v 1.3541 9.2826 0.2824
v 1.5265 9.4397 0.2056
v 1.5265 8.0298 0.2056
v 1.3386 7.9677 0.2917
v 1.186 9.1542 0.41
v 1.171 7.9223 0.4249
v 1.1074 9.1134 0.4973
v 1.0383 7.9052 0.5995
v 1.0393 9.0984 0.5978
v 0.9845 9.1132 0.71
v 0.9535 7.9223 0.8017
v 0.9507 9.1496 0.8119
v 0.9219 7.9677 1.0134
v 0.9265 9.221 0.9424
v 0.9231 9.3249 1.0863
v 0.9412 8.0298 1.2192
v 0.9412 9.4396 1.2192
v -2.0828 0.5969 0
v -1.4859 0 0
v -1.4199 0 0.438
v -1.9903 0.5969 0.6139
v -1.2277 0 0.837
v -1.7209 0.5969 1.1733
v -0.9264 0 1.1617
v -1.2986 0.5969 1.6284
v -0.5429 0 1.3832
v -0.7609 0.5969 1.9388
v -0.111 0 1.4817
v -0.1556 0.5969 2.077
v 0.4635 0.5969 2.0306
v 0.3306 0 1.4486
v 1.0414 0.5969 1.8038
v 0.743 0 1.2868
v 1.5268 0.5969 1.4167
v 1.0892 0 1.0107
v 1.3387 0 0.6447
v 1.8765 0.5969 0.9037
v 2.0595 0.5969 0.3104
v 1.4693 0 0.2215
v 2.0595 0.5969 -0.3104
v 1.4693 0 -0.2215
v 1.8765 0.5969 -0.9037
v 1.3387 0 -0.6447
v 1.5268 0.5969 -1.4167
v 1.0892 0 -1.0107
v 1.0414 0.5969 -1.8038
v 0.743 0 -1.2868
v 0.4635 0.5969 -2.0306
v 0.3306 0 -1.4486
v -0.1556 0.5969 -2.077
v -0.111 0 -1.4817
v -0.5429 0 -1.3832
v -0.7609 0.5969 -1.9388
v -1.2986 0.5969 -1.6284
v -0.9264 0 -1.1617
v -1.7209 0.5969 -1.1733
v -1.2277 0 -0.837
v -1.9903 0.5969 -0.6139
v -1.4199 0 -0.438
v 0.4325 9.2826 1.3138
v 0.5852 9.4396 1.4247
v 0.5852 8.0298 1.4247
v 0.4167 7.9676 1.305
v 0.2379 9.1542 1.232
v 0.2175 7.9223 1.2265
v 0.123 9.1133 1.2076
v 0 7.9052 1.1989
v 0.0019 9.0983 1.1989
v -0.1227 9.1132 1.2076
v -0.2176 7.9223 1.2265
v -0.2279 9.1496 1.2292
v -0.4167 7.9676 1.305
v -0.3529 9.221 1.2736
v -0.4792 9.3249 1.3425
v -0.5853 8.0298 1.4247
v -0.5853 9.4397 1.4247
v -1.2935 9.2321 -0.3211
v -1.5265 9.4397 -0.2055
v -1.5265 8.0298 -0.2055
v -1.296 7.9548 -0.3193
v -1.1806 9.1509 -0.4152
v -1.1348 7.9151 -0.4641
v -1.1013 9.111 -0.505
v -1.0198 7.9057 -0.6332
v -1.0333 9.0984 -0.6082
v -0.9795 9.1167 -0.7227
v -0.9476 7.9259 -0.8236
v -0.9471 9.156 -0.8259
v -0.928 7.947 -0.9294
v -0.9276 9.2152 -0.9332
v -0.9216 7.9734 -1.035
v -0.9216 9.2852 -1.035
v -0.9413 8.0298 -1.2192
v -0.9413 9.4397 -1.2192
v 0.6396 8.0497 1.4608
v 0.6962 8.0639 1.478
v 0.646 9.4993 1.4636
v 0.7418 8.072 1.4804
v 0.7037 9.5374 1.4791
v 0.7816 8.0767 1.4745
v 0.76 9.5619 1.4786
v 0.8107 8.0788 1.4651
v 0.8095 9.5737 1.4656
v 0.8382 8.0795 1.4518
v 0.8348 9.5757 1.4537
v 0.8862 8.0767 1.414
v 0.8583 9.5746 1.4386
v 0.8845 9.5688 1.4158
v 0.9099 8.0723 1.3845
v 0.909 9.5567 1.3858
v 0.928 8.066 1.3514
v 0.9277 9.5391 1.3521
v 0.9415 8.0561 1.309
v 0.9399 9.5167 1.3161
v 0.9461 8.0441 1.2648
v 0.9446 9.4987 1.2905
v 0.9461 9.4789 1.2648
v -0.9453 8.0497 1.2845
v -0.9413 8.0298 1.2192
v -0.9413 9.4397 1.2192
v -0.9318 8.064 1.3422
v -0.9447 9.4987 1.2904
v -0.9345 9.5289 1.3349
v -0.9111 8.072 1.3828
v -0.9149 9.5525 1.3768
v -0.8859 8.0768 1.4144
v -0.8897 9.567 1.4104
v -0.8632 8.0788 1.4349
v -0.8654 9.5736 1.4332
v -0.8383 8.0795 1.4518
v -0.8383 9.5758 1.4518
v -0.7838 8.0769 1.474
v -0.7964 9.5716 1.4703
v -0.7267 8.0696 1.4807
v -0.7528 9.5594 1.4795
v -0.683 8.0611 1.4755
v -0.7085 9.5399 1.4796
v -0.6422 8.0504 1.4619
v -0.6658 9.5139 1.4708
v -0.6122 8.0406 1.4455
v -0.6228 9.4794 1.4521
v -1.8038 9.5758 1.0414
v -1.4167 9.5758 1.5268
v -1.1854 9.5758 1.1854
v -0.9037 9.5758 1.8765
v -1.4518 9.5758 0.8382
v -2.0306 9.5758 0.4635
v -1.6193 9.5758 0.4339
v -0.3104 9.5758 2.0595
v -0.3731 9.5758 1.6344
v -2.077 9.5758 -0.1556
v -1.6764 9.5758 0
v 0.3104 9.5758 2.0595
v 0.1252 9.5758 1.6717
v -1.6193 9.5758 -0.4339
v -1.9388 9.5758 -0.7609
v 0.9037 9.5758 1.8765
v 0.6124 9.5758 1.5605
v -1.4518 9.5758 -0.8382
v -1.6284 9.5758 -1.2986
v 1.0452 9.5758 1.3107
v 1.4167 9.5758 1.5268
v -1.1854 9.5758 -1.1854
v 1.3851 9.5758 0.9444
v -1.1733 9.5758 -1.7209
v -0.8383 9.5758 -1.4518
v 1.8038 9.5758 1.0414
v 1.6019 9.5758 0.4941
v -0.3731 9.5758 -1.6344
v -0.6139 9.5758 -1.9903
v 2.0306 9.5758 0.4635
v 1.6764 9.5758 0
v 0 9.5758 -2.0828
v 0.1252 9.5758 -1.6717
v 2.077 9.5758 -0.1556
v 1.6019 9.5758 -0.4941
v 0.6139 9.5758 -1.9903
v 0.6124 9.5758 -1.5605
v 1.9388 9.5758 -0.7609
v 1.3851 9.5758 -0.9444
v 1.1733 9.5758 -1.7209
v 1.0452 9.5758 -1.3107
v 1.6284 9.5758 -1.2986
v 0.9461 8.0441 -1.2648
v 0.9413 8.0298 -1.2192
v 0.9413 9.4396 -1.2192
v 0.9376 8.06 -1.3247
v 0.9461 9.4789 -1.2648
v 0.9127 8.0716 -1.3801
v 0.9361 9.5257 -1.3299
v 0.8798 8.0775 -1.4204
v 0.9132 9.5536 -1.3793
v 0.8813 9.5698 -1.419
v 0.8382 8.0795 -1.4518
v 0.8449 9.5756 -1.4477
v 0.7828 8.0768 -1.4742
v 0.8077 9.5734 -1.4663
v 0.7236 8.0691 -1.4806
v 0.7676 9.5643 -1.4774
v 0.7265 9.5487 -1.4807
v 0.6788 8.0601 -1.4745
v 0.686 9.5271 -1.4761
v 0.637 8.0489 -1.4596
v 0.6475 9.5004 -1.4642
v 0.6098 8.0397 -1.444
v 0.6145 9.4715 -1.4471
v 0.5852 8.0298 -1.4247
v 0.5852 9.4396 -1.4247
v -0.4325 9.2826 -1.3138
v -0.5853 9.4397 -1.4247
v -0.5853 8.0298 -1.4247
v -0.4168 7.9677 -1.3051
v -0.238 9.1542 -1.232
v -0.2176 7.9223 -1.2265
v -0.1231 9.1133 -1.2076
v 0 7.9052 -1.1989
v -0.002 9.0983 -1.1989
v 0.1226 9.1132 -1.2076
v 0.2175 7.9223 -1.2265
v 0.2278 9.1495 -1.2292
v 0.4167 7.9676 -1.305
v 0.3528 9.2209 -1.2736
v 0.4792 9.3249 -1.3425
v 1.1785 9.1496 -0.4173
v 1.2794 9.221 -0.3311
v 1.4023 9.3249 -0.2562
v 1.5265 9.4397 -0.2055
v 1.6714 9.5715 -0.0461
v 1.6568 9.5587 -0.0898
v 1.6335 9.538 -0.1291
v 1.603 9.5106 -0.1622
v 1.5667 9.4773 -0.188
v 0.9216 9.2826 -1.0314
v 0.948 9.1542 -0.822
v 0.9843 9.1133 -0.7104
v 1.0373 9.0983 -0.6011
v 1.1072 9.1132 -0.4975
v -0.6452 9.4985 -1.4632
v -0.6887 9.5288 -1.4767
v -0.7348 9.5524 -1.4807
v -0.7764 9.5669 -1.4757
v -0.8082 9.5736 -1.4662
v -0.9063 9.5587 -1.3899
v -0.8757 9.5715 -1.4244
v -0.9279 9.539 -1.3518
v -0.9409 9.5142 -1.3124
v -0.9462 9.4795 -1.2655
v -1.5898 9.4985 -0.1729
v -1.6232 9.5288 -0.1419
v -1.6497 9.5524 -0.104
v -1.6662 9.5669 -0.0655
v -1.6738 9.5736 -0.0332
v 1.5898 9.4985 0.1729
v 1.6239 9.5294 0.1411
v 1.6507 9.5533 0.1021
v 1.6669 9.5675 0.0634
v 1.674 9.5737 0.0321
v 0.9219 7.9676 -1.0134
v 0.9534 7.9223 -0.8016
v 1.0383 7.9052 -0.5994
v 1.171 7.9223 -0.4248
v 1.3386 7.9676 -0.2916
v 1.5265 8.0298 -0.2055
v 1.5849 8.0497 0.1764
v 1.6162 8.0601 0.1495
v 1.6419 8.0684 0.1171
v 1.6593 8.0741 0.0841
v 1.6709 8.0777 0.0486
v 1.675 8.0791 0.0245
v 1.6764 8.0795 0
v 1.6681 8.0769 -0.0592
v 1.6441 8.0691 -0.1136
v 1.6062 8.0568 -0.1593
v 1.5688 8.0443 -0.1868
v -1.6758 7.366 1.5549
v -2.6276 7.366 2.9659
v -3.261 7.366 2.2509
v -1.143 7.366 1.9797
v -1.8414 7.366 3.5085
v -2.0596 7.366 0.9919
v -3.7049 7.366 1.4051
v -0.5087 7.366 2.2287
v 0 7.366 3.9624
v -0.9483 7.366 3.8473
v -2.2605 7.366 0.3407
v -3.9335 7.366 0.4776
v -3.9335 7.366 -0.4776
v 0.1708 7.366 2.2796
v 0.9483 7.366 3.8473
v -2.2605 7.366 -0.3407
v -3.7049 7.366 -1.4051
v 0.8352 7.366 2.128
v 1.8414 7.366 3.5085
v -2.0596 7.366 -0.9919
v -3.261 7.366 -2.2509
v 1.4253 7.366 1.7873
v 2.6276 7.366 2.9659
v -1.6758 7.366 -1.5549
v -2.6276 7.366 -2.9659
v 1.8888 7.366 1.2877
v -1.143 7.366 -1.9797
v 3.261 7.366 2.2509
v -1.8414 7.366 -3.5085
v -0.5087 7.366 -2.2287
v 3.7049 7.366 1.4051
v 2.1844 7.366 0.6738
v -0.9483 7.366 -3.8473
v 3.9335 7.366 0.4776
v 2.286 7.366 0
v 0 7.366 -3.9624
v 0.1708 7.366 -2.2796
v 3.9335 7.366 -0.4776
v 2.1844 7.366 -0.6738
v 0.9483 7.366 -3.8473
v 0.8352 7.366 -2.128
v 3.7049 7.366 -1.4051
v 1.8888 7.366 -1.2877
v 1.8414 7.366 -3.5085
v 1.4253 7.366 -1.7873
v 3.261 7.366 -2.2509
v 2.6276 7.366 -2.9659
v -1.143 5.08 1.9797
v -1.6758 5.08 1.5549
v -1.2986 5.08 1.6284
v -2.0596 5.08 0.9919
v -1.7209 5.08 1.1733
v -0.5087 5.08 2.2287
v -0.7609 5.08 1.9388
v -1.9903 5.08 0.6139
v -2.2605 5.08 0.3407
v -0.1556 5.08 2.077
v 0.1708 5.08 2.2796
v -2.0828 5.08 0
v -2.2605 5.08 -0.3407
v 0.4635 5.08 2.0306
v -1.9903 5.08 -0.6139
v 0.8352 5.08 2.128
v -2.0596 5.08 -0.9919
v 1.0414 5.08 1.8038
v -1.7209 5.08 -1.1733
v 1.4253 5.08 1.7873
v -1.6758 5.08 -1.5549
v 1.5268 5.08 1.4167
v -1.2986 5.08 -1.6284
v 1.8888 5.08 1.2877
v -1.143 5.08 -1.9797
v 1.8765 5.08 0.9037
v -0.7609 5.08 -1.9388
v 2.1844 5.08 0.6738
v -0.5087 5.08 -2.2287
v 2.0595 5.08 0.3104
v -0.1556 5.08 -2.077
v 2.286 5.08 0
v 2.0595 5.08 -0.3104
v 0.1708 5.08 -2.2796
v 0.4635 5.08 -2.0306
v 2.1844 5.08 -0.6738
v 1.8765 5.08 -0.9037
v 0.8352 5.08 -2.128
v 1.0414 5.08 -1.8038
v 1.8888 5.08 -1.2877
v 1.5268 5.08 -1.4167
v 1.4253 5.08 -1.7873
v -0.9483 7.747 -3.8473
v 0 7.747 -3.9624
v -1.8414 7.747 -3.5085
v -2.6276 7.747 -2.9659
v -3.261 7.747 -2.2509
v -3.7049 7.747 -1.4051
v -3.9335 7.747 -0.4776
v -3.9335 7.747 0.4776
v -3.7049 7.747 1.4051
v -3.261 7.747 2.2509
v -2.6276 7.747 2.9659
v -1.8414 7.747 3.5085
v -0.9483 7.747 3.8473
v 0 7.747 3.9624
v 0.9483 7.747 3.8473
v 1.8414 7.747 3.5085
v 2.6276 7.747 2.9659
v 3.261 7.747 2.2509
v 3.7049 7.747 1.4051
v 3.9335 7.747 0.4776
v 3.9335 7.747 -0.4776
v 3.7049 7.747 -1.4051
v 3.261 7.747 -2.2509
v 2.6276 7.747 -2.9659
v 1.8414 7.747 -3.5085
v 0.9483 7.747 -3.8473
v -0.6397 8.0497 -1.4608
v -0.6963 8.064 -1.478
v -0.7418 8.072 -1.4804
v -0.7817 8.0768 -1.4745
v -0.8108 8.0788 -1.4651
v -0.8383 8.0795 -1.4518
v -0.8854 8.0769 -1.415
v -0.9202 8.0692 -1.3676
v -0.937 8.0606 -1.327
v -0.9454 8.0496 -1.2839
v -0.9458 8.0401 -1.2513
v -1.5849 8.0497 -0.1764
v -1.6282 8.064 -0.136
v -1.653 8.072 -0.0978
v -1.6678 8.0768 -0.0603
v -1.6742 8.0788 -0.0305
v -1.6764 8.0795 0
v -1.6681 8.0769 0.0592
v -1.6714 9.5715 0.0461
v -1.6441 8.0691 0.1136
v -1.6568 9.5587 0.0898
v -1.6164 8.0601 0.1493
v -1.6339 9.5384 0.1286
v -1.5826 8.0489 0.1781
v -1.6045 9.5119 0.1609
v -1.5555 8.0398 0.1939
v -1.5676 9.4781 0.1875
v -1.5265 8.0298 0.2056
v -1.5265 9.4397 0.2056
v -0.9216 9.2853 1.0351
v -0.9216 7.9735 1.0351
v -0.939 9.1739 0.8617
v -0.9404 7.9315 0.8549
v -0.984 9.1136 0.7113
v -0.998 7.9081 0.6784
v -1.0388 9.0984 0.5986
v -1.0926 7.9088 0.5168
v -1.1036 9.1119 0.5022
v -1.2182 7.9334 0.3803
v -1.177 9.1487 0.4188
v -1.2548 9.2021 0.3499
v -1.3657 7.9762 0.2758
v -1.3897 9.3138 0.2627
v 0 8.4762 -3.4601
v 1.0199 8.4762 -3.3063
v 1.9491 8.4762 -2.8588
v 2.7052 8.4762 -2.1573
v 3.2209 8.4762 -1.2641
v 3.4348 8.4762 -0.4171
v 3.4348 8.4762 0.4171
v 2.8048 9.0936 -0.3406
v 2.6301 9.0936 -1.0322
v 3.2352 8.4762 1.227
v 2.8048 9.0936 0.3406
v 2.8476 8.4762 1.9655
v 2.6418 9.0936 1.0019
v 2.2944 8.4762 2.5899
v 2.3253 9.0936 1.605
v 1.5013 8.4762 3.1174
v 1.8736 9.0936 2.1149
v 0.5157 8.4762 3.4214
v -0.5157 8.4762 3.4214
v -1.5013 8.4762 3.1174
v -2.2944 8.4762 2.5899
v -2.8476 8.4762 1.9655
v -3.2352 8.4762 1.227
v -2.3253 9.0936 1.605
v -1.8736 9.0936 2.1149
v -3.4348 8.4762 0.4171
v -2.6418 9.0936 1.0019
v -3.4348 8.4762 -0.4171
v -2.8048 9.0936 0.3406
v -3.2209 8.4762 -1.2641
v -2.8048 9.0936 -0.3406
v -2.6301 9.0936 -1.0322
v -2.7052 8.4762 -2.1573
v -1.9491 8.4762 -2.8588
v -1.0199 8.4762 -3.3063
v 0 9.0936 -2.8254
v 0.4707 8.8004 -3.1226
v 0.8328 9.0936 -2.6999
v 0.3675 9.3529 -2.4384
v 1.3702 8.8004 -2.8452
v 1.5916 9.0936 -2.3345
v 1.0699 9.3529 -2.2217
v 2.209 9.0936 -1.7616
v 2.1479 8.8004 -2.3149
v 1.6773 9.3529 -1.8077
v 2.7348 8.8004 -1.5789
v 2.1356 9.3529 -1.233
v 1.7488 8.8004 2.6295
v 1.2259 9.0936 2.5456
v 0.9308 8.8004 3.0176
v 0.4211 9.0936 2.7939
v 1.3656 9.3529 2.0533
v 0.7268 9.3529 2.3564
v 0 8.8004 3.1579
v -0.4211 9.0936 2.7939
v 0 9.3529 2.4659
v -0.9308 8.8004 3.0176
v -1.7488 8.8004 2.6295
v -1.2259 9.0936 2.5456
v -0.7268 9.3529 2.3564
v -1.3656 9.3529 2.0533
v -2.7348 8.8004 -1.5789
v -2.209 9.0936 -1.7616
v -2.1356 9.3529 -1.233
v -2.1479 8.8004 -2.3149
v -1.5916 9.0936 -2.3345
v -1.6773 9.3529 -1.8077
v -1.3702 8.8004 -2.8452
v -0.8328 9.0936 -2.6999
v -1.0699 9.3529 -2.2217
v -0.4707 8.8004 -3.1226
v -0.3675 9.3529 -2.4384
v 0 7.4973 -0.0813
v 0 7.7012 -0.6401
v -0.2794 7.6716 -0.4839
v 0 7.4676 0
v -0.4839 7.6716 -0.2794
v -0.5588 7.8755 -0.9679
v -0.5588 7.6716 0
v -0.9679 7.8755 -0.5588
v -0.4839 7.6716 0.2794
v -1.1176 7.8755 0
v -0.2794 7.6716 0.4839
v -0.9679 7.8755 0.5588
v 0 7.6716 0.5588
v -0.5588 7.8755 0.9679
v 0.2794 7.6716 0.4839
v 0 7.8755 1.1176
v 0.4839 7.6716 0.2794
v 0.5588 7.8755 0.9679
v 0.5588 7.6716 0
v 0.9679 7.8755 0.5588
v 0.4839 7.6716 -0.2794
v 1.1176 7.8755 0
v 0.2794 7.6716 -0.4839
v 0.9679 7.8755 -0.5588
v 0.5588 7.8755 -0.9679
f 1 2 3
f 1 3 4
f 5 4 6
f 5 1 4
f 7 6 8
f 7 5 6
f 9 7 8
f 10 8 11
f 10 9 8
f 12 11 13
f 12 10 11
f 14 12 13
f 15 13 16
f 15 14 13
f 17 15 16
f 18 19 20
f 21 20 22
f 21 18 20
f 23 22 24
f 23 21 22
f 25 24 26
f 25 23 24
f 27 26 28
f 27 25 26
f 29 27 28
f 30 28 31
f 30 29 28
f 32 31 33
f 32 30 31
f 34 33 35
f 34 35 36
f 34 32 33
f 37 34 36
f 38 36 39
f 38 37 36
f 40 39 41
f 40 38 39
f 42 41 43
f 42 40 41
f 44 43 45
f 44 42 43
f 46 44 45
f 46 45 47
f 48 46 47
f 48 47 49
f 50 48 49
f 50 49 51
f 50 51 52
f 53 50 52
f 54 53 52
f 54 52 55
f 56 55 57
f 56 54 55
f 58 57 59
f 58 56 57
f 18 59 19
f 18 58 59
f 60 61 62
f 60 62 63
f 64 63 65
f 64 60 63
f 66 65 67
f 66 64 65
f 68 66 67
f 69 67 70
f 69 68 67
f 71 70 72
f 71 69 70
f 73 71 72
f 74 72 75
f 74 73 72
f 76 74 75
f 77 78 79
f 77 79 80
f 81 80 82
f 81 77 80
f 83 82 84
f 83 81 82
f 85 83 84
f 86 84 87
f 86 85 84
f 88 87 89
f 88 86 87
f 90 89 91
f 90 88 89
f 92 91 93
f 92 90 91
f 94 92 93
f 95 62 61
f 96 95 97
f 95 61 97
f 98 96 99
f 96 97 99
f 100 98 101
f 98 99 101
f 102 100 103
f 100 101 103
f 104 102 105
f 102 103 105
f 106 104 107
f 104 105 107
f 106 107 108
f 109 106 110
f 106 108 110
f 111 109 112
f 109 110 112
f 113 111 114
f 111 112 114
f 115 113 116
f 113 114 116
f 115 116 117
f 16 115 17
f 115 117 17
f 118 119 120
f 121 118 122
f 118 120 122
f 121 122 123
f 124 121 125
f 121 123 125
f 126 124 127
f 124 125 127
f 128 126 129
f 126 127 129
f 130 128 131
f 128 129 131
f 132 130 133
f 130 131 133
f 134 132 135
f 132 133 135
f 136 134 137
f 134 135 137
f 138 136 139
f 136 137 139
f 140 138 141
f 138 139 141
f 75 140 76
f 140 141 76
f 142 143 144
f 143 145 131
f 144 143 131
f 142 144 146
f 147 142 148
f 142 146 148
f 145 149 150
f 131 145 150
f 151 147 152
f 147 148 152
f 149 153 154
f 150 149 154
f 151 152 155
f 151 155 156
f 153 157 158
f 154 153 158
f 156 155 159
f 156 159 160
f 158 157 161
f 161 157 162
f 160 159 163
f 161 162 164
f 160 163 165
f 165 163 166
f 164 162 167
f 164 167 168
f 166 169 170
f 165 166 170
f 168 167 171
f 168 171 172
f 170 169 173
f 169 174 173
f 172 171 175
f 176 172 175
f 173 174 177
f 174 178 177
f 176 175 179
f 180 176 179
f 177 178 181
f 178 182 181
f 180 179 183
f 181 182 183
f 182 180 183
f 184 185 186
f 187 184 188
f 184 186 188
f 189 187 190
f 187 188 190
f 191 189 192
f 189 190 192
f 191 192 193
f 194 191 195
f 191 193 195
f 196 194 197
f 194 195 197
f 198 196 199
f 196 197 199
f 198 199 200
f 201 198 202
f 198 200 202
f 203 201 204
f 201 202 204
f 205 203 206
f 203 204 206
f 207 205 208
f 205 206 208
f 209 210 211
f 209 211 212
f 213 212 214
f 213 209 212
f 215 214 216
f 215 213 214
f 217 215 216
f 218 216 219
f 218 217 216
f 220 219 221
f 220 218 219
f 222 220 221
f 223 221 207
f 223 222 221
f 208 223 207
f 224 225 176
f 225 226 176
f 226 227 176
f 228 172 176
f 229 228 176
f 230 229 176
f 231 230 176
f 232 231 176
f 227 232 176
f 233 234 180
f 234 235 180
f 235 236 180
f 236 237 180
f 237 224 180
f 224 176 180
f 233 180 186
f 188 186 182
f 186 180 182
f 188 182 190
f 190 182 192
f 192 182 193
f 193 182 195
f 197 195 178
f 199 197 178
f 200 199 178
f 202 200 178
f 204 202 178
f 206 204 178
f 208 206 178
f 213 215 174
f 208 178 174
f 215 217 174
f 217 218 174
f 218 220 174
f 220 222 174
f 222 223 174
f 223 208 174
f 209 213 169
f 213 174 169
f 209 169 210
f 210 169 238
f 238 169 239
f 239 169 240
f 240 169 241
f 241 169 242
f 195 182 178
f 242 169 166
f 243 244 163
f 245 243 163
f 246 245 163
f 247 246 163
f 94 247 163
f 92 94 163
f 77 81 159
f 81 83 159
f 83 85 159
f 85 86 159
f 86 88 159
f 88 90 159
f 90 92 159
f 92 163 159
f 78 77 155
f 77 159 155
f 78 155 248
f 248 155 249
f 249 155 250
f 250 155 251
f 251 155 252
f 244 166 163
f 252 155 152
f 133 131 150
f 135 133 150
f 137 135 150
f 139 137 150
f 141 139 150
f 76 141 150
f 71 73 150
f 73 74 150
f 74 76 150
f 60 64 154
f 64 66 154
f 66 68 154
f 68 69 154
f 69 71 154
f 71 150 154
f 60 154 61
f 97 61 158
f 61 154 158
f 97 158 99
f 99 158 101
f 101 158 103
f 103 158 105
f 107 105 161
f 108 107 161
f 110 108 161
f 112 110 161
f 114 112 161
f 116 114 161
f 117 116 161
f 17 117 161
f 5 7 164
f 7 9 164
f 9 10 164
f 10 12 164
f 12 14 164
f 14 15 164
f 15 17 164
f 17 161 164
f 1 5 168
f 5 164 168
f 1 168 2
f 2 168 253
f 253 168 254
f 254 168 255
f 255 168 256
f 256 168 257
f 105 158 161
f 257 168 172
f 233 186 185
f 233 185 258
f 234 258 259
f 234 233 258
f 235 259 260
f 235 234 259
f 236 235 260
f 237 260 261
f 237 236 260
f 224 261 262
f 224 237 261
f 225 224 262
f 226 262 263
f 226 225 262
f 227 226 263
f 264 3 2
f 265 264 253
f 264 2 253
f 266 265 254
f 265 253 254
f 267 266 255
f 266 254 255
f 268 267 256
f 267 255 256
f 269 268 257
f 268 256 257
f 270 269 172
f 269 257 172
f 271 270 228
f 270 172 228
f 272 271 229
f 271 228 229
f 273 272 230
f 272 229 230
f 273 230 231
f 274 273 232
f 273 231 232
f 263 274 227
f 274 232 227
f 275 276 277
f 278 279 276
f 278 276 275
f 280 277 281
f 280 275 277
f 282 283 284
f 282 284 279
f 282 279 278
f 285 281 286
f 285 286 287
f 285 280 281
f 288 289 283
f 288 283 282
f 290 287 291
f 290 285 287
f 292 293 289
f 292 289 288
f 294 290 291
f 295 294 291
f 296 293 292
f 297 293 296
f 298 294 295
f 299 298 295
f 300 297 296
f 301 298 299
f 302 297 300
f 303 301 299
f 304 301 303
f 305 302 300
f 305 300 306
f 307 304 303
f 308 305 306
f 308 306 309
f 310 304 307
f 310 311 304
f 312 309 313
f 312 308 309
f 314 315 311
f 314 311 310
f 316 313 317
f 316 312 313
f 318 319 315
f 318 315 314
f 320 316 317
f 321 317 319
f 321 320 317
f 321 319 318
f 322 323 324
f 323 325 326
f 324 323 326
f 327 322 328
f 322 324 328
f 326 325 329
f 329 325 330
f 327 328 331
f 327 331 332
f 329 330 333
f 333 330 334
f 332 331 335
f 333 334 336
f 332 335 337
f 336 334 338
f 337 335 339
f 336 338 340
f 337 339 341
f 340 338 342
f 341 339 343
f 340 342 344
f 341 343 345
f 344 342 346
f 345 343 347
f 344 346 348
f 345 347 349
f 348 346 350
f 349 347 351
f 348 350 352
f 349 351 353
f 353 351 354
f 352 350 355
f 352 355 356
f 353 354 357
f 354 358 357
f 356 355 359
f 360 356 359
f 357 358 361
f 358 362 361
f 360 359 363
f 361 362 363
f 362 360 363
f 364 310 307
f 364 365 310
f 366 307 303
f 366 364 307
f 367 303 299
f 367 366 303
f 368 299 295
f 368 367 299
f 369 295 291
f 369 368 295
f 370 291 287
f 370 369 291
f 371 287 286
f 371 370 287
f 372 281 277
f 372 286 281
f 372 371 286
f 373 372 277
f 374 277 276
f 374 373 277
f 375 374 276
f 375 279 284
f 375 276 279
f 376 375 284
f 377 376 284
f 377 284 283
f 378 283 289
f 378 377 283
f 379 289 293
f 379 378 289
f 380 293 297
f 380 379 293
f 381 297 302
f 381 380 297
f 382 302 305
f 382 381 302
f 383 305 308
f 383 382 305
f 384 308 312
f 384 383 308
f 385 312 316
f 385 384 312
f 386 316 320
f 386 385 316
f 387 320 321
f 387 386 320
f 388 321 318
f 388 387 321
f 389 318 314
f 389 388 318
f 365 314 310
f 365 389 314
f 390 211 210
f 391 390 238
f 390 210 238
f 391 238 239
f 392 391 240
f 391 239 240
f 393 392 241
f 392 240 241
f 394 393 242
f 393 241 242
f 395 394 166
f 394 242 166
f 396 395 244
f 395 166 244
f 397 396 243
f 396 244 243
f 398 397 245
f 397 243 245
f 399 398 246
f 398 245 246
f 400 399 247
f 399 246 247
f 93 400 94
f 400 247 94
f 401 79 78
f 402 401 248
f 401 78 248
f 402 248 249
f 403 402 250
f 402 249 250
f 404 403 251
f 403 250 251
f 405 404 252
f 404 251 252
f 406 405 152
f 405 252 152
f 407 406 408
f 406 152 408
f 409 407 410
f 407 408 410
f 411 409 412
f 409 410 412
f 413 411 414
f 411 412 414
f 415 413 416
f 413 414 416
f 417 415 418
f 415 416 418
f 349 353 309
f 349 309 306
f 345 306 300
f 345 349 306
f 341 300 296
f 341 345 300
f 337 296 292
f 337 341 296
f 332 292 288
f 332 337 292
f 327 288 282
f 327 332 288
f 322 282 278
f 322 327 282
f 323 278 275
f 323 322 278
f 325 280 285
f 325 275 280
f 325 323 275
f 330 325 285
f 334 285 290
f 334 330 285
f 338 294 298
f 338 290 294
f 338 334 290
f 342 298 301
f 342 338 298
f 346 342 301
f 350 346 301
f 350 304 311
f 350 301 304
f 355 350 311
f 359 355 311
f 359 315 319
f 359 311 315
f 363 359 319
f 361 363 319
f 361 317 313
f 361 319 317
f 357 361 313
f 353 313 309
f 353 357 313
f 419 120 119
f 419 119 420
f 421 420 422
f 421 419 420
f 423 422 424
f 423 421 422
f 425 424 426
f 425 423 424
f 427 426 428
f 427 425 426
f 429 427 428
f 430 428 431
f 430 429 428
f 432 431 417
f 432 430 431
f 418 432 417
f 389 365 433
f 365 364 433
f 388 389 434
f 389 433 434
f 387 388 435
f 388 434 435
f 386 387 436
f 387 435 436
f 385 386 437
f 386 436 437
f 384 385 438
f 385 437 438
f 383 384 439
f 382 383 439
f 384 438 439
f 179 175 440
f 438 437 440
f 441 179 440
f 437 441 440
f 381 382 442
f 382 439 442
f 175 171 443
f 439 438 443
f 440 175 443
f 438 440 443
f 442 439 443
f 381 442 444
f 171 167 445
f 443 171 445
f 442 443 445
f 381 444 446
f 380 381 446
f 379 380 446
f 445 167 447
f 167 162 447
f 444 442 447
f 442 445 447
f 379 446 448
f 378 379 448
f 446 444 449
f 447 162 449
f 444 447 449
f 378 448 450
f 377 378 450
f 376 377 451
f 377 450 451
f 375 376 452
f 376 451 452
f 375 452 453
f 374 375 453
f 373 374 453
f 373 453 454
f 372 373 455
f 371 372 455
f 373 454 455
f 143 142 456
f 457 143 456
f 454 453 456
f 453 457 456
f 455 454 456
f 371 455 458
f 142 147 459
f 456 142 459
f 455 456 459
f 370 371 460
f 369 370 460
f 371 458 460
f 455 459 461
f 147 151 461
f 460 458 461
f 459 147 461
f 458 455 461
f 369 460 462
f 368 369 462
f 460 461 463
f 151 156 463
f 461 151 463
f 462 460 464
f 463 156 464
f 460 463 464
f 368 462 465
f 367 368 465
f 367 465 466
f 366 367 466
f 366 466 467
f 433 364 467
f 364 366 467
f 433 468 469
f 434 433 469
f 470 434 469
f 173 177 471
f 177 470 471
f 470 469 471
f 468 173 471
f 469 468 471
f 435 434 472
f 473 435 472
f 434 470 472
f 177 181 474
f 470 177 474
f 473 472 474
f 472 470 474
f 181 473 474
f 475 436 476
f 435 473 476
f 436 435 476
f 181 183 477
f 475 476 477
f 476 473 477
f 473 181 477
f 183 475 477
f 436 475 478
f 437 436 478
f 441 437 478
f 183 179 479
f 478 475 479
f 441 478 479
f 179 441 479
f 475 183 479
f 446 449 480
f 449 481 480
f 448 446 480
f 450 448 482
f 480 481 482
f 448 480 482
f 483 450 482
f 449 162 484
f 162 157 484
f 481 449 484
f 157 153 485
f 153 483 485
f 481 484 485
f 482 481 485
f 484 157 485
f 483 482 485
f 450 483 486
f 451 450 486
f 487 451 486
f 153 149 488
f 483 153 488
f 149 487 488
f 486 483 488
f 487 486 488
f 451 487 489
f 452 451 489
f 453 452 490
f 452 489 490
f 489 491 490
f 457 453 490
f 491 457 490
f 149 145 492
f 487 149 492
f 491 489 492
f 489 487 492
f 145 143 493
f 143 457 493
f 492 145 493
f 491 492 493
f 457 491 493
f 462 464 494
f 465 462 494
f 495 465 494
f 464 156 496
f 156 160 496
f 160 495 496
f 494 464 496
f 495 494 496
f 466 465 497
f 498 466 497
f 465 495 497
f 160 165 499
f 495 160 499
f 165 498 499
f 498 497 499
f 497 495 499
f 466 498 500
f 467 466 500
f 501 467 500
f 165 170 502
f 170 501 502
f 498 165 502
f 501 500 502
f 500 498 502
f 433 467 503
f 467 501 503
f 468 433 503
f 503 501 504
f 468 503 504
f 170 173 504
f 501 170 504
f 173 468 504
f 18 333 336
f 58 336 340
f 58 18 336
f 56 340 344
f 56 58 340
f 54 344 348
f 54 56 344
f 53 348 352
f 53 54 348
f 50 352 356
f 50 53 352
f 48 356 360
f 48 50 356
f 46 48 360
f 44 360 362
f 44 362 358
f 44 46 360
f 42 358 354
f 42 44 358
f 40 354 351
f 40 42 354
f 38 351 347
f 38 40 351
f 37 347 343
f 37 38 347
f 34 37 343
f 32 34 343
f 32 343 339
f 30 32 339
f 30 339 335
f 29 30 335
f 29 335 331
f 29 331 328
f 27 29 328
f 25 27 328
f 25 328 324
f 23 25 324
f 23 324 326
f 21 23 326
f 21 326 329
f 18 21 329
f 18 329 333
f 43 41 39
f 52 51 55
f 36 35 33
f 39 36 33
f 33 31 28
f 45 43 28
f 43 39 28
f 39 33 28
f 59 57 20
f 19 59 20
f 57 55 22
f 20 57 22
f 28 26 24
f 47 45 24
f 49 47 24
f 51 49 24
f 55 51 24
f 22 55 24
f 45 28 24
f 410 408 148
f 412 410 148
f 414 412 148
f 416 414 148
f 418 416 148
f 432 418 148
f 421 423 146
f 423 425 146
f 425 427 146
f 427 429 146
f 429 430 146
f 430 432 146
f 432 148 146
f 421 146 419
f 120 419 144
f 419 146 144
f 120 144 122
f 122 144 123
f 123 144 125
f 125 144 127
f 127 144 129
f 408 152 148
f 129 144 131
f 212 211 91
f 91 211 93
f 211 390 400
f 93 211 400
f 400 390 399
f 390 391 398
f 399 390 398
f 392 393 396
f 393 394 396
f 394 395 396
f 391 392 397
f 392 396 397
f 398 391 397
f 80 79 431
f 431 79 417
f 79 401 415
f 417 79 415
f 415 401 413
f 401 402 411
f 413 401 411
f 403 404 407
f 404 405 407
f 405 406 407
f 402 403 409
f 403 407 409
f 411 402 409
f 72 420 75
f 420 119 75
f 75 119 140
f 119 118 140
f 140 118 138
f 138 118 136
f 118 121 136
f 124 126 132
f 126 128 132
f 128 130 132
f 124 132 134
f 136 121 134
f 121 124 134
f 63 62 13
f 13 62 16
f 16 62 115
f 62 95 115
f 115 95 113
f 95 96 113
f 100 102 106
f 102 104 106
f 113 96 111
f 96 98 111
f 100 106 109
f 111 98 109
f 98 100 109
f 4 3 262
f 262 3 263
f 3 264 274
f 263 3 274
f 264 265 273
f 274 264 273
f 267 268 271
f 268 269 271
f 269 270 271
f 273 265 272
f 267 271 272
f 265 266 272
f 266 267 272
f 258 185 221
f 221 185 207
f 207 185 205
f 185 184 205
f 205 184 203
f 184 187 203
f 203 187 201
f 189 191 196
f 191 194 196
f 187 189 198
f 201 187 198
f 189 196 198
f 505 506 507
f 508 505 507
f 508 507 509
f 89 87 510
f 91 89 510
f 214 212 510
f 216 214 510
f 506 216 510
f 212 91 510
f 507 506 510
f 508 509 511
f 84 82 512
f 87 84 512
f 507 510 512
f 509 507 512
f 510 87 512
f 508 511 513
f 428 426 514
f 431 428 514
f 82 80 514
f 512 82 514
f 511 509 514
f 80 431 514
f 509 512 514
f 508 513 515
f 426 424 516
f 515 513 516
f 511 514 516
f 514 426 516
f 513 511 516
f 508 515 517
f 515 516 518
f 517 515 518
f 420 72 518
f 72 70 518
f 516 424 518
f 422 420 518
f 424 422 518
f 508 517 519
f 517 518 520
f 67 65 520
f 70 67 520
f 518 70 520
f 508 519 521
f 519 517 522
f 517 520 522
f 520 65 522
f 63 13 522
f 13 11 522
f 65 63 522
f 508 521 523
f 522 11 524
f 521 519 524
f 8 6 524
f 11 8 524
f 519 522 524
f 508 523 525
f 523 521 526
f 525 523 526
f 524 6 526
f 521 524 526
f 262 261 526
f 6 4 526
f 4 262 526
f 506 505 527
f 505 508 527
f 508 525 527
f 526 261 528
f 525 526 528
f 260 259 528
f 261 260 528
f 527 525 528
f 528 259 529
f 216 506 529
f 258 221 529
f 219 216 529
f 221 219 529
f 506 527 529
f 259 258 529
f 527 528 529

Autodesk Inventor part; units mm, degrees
ref_plane "YZ Plane" through (0, 0, 0) normal (1, 0, 0) x (0, 1, 0)
ref_plane "XZ Plane" through (0, 0, 0) normal (0, 1, 0) x (-1, 0, 0)
ref_plane "XY Plane" through (0, 0, 0) normal (0, 0, 1) x (1, 0, 0)
sketch "Sketch1" plane through (0, 0, 0) normal (0, 1, 0) x (-1, 0, 0)
  circle A0 centre (0, 0) radius 2.0828
  dimension "d4" = 4.1656
extrude "Body" add sketch "Sketch1" along normal blind 7.366
sketch "Sketch2" plane through (0, 0, 0) normal (1, 0, 0) x (0, 1, 0)
  line L0 (7.366, -2.0828) -> (7.366, 2.0828) projected
  line L1 (7.366, 0) -> (7.366, -3.9624)
  line L2 (7.366, -3.9624) -> (7.747, -3.9624)
  arc A0 (7.747, -3.9624) -> (9.5758, -2.0828) centre (5.5548, 0) ccw
  line L3 (9.5758, -2.0828) -> (9.5758, -1.6764)
  line L4 (9.5758, -1.6764) -> (8.0795, -1.6764)
  line L5 (8.0795, -1.6764) -> (7.4676, 0)
  line L6 (7.4676, 0) -> (7.366, 0)
  point P0 (0, 0)
  dimension "d5" = 3.9624
  dimension "d6" = 0.381
  dimension "d13" = 0.1016
  dimension "d14" = 2.0828
  dimension "d15" = 2.2098
  dimension "d16" = 0
  dimension "d17" = 1.6764
  dimension "d57" = 20.053
revolve "Head" add sketch "Sketch2" angle 360 about axis through (0, 7.4676, 0) along (0, -1, 0)
sketch "Sketch3" plane through (0, 9.5758, 0) normal (0, 1, 0) x (1, 0, 0)
  circle A0 centre (0, 0) radius 1.6764 projected
  line L0 (0.7302, -1.2648) -> (-0.7303, -1.2648) construction
  line L1 (-0.7303, -1.2648) -> (-1.4605, 0) construction
  line L2 (-1.4605, 0) -> (-0.7303, 1.2648) construction
  line L3 (-0.7303, 1.2648) -> (0.7302, 1.2648) construction
  line L4 (0.7302, 1.2648) -> (1.4605, 0) construction
  line L5 (1.4605, 0) -> (0.7302, -1.2648) construction
  circle A1 centre (-0.7303, -1.2648) radius 0.2159
  circle A2 centre (-1.4605, 0) radius 0.2159
  circle A3 centre (-0.7303, 1.2648) radius 0.2159
  circle A4 centre (0.7302, 1.2648) radius 0.2159
  circle A5 centre (1.4605, 0) radius 0.2159
  circle A6 centre (0.7302, -1.2648) radius 0.2159
  circle A7 centre (0, -2.0701) radius 0.8712
  circle A8 centre (0, 2.0701) radius 0.8712
  circle A9 centre (1.7928, -1.0351) radius 0.8712
  circle A10 centre (-1.7928, 1.035) radius 0.8712
  circle A11 centre (1.7928, 1.035) radius 0.8712
  circle A12 centre (-1.7928, -1.0351) radius 0.8712
  circle A13 centre (0, 0) radius 1.8188
  point P0 (0, 0)
  point P1 (0, 0)
  point P2 (0.9413, 1.2192)
  point P3 (1.5265, 0.2056)
  point P4 (1.5265, -0.2056)
  point P5 (0.9413, -1.2192)
  point P6 (0.5852, -1.4248)
  point P7 (-0.5852, -1.4248)
  point P8 (-0.9413, -1.2192)
  point P9 (-1.5265, -0.2056)
  point P10 (-1.5265, 0.2056)
  point P11 (-0.9413, 1.2192)
  point P12 (-0.5852, 1.4248)
  point P13 (0.5852, 1.4248)
  dimension "d58" = 2.921
  dimension "d59" = 4.1402
  dimension "d62" = 120
extrude "Hex" add sketch "Sketch3" against normal blind 1.778 contours A5 A11 A0 | A0 A11 A13 A9 | A0 A9 A5 | A11 A0 | A0 A11 A13 | A9 A13 A0 | A0 A9 | A11 A4 A0 | A0 A8 A13 A11 | A9 A13 A7 A0 | A0 A6 A9 | A4 A8 A0 | A0 A7 A6 | A8 A0 | A7 A0 | A0 A8 A13 | A7 A13 A0 | A3 A0 A8 | A7 A0 A1 | A0 A10 A13 A8 | A7 A13 A12 A0 | A3 A10 A0 | A0 A12 A1 | A10 A0 A13 | A13 A12 A0 | A10 A0 | A0 A12 | A10 A0 A12 A13 | A10 A2 A0 | A0 A2 A12
sketch "Sketch4" plane through (0, 0, 0) normal (0, 0, 1) x (1, 0, 0)
  line L0 (-0.7364, 8.6358) -> (-1.6764, 9.5758)
  line L1 (0, 9.5758) -> (-0.7364, 8.6358)
  line L2 (0, -10.602) -> (0, 63.6118) projected
  line L3 (-1.5265, 9.5758) -> (-1.5265, 8.0298) projected
  line L4 (-1.5265, 9.5758) -> (-1.5265, 9.5758) projected
  line L5 (-1.5265, 9.5758) -> (-1.5265, 8.0298) projected
  line L6 (-1.6764, 9.5758) -> (-1.5265, 9.5758) projected
  line L7 (-1.6764, 9.5758) -> (0, 9.5758)
  point P0 (0, 0)
  point P1 (-1.6764, 8.0795)
  dimension "d29" = 1.6764
revolve "Head Chamfer" cut sketch "Sketch4" angle 360 about axis through (0, -10, 0) along (0, 1, 0)
sketch "Sketch5" plane through (0, 0, 0) normal (1, 0, 0) x (0, 1, 0)
  line L0 (0, -2.0828) -> (7.366, -2.0828) projected
  line L1 (7.366, 3.9624) -> (7.366, -3.9624) projected
  line L2 (7.366, -2.0828) -> (7.366, 2.0828) projected
  line L3 (0.0745, -2.0828) -> (-0.2261, -2.6035)
  line L4 (-0.2261, -2.6035) -> (-0.3253, -2.6035)
  line L5 (-0.3253, -2.6035) -> (-0.626, -2.0828)
  line L6 (0.0686, -2.6035) -> (-0.7252, -2.6035) construction
  line L7 (-0.626, -2.0828) -> (0.0745, -2.0828)
  line L8 (0, -2.0828) -> (7.366, -2.0828) projected
  point P0 (0, 0)
  dimension "d31" = 30
  dimension "d32" = 60
  dimension "a" = 0.0992
  dimension "d46" = 0.7937
  dimension "d54" = 0.0686
  dimension "d55" = 0.5207
  dimension "d56" = 0.0992
feature "Thread" [suppressed]
sketch "Sketch6" plane through (0, 0, 0) normal (0, 0, 1) x (1, 0, 0)
  line L0 (0, 0) -> (-1.4859, 0)
  line L1 (2.0828, 0) -> (-2.0828, 0) projected
  line L2 (-1.4859, 0) -> (-2.4948, 1.0089)
  line L3 (-2.4948, 1.0089) -> (-2.9651, -1.2188)
  line L4 (-2.9651, -1.2188) -> (-1.4859, -1.2188)
  line L5 (-2.0828, 0) -> (-2.0828, 7.366) projected
  line L6 (-1.4859, -1.2188) -> (-1.4859, 0)
  line L7 (0, -11.613) -> (0, 61.146) projected
  point P0 (-2.0828, 0.5969)
  dimension "d49" = 1.4859
  dimension "d50" = 135
revolve "Tapered End" cut sketch "Sketch6" angle 360 about axis through (0, -10, 0) along (0, 1, 0)
sketch "Sketch8" plane through (0, 0, 0) normal (0, 0, 1) x (1, 0, 0)
  line L0 (-3.9624, 7.366) -> (3.9624, 7.366) projected
  line L1 (0, 7.366) -> (2.286, 7.366)
  line L2 (2.286, 7.366) -> (2.286, 5.08)
  line L3 (2.286, 5.08) -> (0, 5.08)
  line L4 (0, 5.08) -> (0, 7.366)
  point P0 (0, 0)
  dimension "d69" = 2.286
  dimension "d70" = 2.286
revolve "Shoulder" add sketch "Sketch8" angle 360 about axis through (0, 5.08, 0) along (0, 1, 0)
equation "\"d56\" = a"
equation "\"ShoulderLength\" = 2.286"
properties part number "Shoulder Screw 8-32 Shoulder 0.090 Length 0.290" material "VEX Steel"
